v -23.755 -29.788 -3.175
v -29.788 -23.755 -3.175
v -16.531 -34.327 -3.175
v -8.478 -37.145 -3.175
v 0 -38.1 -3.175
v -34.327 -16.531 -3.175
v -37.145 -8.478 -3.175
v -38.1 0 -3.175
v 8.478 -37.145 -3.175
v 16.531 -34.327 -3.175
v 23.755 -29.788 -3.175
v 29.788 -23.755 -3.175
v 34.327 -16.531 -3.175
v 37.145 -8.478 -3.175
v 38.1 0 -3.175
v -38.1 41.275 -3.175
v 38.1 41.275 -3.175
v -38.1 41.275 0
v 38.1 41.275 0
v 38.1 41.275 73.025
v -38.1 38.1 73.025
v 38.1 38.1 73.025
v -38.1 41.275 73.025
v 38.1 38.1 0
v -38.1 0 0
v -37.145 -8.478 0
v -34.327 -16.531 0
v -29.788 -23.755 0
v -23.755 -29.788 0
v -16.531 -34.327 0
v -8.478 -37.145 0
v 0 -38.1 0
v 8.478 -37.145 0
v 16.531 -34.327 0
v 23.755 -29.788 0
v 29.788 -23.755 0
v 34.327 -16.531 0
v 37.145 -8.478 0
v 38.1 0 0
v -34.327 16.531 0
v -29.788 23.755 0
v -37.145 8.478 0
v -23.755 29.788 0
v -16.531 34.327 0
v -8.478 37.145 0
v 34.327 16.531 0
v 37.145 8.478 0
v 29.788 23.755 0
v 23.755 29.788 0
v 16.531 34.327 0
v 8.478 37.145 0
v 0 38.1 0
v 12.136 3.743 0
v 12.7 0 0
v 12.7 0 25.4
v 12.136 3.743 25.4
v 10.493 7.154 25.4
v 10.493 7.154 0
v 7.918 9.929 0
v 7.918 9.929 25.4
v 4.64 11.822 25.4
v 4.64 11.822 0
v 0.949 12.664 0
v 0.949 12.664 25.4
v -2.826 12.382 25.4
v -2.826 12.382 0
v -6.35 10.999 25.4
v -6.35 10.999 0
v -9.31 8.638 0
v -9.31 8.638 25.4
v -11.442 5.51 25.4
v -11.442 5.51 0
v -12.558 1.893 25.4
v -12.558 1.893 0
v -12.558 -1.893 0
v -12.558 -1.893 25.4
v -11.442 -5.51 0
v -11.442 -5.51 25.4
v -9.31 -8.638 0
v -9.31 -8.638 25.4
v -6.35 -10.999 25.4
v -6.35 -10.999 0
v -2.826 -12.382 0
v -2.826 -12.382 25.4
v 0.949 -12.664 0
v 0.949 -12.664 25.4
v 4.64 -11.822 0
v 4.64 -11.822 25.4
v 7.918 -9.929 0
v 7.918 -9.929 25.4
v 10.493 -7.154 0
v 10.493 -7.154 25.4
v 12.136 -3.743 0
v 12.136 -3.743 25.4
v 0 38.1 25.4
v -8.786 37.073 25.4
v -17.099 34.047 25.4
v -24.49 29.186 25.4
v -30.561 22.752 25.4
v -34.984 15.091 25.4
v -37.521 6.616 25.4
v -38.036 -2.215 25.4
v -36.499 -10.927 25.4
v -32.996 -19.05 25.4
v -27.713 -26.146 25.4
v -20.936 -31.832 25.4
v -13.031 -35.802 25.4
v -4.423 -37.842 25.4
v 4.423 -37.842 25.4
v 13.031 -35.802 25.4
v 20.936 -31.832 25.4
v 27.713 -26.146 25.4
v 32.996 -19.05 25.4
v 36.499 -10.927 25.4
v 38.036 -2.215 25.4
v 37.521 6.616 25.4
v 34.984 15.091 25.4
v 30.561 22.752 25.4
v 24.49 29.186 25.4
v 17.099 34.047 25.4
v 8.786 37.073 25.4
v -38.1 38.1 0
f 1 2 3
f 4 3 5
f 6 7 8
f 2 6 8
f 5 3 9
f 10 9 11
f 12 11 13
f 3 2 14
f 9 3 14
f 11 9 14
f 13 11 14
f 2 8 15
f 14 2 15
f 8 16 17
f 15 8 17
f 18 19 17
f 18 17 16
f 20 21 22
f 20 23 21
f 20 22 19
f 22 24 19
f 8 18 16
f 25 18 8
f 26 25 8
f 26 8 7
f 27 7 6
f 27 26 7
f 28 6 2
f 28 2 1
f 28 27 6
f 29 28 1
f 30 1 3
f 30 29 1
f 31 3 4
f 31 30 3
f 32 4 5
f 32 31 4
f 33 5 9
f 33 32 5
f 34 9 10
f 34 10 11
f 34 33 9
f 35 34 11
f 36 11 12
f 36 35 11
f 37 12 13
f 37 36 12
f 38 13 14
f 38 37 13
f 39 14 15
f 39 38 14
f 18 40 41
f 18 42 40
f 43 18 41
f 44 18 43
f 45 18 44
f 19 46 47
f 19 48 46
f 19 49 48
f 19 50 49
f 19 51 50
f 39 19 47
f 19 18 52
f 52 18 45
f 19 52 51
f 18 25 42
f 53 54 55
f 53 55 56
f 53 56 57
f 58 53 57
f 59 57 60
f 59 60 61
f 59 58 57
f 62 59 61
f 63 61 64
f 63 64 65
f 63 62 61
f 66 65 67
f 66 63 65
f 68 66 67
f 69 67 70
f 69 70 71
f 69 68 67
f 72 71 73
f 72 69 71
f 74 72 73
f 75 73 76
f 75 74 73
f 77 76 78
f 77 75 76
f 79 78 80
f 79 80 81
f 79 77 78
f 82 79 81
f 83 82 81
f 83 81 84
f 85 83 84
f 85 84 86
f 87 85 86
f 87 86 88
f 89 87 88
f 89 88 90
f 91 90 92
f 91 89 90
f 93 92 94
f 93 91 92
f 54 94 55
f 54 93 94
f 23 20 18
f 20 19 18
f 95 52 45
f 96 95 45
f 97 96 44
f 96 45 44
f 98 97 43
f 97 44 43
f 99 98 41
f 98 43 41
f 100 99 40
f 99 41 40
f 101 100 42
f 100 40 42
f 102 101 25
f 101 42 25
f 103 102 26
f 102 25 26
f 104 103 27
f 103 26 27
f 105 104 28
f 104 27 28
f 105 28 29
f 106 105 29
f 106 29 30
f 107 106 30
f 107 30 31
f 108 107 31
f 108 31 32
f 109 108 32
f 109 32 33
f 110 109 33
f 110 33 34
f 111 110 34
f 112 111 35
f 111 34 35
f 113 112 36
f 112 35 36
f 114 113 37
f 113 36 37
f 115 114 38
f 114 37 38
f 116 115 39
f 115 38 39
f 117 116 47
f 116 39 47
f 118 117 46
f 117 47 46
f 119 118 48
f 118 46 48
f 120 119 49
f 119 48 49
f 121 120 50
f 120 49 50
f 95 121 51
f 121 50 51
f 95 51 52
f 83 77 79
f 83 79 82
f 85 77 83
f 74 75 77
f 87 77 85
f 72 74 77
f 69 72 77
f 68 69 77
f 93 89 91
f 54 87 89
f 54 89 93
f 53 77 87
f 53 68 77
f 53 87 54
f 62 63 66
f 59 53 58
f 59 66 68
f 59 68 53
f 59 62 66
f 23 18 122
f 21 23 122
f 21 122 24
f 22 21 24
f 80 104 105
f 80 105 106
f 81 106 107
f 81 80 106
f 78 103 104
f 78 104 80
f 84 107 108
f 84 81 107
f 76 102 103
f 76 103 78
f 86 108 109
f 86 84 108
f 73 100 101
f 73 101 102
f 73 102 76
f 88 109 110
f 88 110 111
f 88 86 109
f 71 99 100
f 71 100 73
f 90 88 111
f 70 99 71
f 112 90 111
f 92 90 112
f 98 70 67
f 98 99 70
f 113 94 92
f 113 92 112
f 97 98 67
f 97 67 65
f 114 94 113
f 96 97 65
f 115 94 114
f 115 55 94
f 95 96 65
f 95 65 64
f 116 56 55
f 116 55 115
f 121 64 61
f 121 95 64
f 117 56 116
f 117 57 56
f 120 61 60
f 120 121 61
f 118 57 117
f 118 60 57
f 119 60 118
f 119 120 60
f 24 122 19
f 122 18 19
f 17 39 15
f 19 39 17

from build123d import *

# Parameters (mm, degrees)
F1_DEPTH = 25.4
F0_R     = 12.7
F2_DEPTH = 3.175
F3_DEPTH = 47.625


with BuildPart() as f1:
    # F0 (on Top) → F1 (new body)
    with BuildSketch(Plane.XY):
        Polygon((-38.1, 38.1), (0, 38.1), (38.1, 38.1), (38.1, 41.275), (-38.1, 41.275), align=None)
    extrude(amount=F1_DEPTH)

    # F3 (add): a face of the model
    f3_faces = [f1.faces().sort_by_distance(p)[0] for p in [
        (0, 39.6875, 25.4),
    ]]
    extrude(f3_faces, amount=F3_DEPTH)


with BuildPart() as f1b:
    # F0 (on Top) → F1, piece 2 (new body)
    with BuildSketch(Plane.XY):
        with BuildLine():
            ThreePointArc((0, 38.1), (-26.9407683632, 26.9407683632), (-38.1, 0))
            ThreePointArc((-38.1, 0), (0, -38.1), (38.1, 0))
            ThreePointArc((38.1, 0), (26.9407683632, 26.9407683632), (0, 38.1))
        make_face()
        Circle(F0_R, mode=Mode.SUBTRACT)
    extrude(amount=F1_DEPTH)

    # F0 (on Top) → F2 (join)
    with BuildSketch(Plane.XY):
        with BuildLine():
            ThreePointArc((0, 38.1), (26.9407683632, 26.9407683632), (38.1, 0))
            Line((38.1, 0), (38.1, 38.1))
            Line((38.1, 38.1), (0, 38.1))
        make_face()
        with BuildLine():
            Line((-38.1, 38.1), (-38.1, 0))
            ThreePointArc((-38.1, 0), (-26.9407683632, 26.9407683632), (0, 38.1))
            Line((0, 38.1), (-38.1, 38.1))
        make_face()
        Polygon((-38.1, 38.1), (0, 38.1), (38.1, 38.1), (38.1, 41.275), (-38.1, 41.275), align=None)
        with BuildLine():
            ThreePointArc((0, 38.1), (-26.9407683632, 26.9407683632), (-38.1, 0))
            ThreePointArc((-38.1, 0), (0, -38.1), (38.1, 0))
            ThreePointArc((38.1, 0), (26.9407683632, 26.9407683632), (0, 38.1))
        make_face()
        Circle(F0_R, mode=Mode.SUBTRACT)
        Circle(F0_R)
    extrude(amount=-F2_DEPTH)


solid = Compound([f1.part, f1b.part])
